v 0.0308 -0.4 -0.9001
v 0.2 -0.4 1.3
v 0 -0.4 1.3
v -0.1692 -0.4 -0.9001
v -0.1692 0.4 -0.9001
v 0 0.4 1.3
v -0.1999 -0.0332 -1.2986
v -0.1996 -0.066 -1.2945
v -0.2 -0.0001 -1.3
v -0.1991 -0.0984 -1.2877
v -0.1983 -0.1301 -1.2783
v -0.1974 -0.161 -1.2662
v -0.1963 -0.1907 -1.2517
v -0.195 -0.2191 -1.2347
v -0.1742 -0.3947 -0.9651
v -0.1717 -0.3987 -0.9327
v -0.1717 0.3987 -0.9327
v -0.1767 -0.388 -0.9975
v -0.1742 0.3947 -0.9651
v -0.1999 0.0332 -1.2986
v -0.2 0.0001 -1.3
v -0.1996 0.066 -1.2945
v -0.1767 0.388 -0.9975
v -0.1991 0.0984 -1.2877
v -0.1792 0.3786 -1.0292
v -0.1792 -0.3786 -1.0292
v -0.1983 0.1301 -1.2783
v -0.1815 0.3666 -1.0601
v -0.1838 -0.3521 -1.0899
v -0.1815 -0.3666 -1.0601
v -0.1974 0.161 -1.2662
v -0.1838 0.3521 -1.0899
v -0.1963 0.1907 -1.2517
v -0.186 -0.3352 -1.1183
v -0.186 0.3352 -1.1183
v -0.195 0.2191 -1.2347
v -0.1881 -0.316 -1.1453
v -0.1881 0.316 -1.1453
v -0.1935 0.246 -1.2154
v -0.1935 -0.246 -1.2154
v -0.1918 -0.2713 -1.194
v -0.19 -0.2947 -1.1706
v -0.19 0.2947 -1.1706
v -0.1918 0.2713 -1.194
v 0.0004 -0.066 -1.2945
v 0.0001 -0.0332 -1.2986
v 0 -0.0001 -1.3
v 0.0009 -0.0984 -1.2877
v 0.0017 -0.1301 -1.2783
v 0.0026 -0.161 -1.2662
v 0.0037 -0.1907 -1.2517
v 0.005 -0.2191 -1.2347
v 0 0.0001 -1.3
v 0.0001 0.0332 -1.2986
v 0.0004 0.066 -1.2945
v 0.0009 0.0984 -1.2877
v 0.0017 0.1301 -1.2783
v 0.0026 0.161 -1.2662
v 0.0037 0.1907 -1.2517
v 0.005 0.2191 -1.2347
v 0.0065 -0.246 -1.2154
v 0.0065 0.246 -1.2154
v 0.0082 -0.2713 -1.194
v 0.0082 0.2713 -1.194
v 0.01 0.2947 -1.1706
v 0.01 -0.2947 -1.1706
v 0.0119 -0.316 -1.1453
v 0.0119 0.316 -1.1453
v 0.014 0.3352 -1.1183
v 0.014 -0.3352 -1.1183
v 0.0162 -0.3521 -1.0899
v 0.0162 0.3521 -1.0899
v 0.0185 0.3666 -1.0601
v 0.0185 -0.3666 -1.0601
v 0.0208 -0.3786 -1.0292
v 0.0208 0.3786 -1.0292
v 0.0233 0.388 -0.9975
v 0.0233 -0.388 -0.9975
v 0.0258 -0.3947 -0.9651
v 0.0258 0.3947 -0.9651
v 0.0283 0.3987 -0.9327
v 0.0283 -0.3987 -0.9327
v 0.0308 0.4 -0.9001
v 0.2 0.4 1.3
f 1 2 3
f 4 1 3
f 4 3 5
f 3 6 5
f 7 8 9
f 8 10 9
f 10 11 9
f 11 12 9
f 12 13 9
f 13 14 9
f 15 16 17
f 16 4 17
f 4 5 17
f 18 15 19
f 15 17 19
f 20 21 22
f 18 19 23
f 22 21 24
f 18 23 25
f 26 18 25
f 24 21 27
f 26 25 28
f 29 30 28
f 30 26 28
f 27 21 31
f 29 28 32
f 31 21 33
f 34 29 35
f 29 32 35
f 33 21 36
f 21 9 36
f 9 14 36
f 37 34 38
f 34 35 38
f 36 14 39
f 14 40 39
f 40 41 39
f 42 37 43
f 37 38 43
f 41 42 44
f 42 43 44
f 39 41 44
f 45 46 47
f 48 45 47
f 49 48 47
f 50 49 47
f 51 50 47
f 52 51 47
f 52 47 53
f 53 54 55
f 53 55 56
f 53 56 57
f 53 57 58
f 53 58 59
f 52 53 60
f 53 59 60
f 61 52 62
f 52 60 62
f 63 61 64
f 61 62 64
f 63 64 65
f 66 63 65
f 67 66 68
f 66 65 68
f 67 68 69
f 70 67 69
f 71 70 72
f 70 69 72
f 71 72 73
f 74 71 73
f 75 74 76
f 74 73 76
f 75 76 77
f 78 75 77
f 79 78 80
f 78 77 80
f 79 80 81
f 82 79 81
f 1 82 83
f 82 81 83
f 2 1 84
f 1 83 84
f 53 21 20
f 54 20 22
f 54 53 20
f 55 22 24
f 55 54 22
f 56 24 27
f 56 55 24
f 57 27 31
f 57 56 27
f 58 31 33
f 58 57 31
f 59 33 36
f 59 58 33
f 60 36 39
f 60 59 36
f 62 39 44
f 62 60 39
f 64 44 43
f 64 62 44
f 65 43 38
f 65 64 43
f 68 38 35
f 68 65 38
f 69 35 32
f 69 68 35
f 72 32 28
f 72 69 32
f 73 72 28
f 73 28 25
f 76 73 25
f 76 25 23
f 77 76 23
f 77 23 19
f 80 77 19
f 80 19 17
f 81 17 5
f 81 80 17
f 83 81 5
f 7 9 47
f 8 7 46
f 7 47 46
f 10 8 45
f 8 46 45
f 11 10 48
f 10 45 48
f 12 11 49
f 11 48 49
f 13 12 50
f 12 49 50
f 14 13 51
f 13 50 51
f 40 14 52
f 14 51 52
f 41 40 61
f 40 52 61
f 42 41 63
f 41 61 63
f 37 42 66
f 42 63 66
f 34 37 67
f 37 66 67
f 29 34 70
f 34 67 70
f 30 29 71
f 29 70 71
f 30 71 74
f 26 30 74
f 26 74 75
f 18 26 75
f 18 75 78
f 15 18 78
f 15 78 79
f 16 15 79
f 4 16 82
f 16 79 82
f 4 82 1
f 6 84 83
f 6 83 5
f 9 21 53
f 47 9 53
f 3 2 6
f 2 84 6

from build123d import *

# Parameters (mm, degrees)
BOSS_EXTRUDE1_DEPTH = 0.4
FILLET1_R           = 0.4


with BuildPart() as part:
    # Sketch1 → Boss-Extrude1 (new, symmetric)
    with BuildSketch(Plane(origin=(0, 0, 0), x_dir=(1, 0, 0), z_dir=(0, 1, 0))):
        Polygon((-0.2, 1.3), (0, 1.3), (0.2, -1.3), (0, -1.3), align=None)
    extrude(amount=BOSS_EXTRUDE1_DEPTH, both=True)

    # Fillet1
    fillet1_edges = [part.edges().sort_by_distance(p)[0] for p in [
        (-0.1, 0.4, -1.3),
        (-0.1, -0.4, -1.3),
    ]]
    fillet(fillet1_edges, radius=FILLET1_R - 0.0001)  # a hair under: the kernel refuses the full size


solid = part.part
